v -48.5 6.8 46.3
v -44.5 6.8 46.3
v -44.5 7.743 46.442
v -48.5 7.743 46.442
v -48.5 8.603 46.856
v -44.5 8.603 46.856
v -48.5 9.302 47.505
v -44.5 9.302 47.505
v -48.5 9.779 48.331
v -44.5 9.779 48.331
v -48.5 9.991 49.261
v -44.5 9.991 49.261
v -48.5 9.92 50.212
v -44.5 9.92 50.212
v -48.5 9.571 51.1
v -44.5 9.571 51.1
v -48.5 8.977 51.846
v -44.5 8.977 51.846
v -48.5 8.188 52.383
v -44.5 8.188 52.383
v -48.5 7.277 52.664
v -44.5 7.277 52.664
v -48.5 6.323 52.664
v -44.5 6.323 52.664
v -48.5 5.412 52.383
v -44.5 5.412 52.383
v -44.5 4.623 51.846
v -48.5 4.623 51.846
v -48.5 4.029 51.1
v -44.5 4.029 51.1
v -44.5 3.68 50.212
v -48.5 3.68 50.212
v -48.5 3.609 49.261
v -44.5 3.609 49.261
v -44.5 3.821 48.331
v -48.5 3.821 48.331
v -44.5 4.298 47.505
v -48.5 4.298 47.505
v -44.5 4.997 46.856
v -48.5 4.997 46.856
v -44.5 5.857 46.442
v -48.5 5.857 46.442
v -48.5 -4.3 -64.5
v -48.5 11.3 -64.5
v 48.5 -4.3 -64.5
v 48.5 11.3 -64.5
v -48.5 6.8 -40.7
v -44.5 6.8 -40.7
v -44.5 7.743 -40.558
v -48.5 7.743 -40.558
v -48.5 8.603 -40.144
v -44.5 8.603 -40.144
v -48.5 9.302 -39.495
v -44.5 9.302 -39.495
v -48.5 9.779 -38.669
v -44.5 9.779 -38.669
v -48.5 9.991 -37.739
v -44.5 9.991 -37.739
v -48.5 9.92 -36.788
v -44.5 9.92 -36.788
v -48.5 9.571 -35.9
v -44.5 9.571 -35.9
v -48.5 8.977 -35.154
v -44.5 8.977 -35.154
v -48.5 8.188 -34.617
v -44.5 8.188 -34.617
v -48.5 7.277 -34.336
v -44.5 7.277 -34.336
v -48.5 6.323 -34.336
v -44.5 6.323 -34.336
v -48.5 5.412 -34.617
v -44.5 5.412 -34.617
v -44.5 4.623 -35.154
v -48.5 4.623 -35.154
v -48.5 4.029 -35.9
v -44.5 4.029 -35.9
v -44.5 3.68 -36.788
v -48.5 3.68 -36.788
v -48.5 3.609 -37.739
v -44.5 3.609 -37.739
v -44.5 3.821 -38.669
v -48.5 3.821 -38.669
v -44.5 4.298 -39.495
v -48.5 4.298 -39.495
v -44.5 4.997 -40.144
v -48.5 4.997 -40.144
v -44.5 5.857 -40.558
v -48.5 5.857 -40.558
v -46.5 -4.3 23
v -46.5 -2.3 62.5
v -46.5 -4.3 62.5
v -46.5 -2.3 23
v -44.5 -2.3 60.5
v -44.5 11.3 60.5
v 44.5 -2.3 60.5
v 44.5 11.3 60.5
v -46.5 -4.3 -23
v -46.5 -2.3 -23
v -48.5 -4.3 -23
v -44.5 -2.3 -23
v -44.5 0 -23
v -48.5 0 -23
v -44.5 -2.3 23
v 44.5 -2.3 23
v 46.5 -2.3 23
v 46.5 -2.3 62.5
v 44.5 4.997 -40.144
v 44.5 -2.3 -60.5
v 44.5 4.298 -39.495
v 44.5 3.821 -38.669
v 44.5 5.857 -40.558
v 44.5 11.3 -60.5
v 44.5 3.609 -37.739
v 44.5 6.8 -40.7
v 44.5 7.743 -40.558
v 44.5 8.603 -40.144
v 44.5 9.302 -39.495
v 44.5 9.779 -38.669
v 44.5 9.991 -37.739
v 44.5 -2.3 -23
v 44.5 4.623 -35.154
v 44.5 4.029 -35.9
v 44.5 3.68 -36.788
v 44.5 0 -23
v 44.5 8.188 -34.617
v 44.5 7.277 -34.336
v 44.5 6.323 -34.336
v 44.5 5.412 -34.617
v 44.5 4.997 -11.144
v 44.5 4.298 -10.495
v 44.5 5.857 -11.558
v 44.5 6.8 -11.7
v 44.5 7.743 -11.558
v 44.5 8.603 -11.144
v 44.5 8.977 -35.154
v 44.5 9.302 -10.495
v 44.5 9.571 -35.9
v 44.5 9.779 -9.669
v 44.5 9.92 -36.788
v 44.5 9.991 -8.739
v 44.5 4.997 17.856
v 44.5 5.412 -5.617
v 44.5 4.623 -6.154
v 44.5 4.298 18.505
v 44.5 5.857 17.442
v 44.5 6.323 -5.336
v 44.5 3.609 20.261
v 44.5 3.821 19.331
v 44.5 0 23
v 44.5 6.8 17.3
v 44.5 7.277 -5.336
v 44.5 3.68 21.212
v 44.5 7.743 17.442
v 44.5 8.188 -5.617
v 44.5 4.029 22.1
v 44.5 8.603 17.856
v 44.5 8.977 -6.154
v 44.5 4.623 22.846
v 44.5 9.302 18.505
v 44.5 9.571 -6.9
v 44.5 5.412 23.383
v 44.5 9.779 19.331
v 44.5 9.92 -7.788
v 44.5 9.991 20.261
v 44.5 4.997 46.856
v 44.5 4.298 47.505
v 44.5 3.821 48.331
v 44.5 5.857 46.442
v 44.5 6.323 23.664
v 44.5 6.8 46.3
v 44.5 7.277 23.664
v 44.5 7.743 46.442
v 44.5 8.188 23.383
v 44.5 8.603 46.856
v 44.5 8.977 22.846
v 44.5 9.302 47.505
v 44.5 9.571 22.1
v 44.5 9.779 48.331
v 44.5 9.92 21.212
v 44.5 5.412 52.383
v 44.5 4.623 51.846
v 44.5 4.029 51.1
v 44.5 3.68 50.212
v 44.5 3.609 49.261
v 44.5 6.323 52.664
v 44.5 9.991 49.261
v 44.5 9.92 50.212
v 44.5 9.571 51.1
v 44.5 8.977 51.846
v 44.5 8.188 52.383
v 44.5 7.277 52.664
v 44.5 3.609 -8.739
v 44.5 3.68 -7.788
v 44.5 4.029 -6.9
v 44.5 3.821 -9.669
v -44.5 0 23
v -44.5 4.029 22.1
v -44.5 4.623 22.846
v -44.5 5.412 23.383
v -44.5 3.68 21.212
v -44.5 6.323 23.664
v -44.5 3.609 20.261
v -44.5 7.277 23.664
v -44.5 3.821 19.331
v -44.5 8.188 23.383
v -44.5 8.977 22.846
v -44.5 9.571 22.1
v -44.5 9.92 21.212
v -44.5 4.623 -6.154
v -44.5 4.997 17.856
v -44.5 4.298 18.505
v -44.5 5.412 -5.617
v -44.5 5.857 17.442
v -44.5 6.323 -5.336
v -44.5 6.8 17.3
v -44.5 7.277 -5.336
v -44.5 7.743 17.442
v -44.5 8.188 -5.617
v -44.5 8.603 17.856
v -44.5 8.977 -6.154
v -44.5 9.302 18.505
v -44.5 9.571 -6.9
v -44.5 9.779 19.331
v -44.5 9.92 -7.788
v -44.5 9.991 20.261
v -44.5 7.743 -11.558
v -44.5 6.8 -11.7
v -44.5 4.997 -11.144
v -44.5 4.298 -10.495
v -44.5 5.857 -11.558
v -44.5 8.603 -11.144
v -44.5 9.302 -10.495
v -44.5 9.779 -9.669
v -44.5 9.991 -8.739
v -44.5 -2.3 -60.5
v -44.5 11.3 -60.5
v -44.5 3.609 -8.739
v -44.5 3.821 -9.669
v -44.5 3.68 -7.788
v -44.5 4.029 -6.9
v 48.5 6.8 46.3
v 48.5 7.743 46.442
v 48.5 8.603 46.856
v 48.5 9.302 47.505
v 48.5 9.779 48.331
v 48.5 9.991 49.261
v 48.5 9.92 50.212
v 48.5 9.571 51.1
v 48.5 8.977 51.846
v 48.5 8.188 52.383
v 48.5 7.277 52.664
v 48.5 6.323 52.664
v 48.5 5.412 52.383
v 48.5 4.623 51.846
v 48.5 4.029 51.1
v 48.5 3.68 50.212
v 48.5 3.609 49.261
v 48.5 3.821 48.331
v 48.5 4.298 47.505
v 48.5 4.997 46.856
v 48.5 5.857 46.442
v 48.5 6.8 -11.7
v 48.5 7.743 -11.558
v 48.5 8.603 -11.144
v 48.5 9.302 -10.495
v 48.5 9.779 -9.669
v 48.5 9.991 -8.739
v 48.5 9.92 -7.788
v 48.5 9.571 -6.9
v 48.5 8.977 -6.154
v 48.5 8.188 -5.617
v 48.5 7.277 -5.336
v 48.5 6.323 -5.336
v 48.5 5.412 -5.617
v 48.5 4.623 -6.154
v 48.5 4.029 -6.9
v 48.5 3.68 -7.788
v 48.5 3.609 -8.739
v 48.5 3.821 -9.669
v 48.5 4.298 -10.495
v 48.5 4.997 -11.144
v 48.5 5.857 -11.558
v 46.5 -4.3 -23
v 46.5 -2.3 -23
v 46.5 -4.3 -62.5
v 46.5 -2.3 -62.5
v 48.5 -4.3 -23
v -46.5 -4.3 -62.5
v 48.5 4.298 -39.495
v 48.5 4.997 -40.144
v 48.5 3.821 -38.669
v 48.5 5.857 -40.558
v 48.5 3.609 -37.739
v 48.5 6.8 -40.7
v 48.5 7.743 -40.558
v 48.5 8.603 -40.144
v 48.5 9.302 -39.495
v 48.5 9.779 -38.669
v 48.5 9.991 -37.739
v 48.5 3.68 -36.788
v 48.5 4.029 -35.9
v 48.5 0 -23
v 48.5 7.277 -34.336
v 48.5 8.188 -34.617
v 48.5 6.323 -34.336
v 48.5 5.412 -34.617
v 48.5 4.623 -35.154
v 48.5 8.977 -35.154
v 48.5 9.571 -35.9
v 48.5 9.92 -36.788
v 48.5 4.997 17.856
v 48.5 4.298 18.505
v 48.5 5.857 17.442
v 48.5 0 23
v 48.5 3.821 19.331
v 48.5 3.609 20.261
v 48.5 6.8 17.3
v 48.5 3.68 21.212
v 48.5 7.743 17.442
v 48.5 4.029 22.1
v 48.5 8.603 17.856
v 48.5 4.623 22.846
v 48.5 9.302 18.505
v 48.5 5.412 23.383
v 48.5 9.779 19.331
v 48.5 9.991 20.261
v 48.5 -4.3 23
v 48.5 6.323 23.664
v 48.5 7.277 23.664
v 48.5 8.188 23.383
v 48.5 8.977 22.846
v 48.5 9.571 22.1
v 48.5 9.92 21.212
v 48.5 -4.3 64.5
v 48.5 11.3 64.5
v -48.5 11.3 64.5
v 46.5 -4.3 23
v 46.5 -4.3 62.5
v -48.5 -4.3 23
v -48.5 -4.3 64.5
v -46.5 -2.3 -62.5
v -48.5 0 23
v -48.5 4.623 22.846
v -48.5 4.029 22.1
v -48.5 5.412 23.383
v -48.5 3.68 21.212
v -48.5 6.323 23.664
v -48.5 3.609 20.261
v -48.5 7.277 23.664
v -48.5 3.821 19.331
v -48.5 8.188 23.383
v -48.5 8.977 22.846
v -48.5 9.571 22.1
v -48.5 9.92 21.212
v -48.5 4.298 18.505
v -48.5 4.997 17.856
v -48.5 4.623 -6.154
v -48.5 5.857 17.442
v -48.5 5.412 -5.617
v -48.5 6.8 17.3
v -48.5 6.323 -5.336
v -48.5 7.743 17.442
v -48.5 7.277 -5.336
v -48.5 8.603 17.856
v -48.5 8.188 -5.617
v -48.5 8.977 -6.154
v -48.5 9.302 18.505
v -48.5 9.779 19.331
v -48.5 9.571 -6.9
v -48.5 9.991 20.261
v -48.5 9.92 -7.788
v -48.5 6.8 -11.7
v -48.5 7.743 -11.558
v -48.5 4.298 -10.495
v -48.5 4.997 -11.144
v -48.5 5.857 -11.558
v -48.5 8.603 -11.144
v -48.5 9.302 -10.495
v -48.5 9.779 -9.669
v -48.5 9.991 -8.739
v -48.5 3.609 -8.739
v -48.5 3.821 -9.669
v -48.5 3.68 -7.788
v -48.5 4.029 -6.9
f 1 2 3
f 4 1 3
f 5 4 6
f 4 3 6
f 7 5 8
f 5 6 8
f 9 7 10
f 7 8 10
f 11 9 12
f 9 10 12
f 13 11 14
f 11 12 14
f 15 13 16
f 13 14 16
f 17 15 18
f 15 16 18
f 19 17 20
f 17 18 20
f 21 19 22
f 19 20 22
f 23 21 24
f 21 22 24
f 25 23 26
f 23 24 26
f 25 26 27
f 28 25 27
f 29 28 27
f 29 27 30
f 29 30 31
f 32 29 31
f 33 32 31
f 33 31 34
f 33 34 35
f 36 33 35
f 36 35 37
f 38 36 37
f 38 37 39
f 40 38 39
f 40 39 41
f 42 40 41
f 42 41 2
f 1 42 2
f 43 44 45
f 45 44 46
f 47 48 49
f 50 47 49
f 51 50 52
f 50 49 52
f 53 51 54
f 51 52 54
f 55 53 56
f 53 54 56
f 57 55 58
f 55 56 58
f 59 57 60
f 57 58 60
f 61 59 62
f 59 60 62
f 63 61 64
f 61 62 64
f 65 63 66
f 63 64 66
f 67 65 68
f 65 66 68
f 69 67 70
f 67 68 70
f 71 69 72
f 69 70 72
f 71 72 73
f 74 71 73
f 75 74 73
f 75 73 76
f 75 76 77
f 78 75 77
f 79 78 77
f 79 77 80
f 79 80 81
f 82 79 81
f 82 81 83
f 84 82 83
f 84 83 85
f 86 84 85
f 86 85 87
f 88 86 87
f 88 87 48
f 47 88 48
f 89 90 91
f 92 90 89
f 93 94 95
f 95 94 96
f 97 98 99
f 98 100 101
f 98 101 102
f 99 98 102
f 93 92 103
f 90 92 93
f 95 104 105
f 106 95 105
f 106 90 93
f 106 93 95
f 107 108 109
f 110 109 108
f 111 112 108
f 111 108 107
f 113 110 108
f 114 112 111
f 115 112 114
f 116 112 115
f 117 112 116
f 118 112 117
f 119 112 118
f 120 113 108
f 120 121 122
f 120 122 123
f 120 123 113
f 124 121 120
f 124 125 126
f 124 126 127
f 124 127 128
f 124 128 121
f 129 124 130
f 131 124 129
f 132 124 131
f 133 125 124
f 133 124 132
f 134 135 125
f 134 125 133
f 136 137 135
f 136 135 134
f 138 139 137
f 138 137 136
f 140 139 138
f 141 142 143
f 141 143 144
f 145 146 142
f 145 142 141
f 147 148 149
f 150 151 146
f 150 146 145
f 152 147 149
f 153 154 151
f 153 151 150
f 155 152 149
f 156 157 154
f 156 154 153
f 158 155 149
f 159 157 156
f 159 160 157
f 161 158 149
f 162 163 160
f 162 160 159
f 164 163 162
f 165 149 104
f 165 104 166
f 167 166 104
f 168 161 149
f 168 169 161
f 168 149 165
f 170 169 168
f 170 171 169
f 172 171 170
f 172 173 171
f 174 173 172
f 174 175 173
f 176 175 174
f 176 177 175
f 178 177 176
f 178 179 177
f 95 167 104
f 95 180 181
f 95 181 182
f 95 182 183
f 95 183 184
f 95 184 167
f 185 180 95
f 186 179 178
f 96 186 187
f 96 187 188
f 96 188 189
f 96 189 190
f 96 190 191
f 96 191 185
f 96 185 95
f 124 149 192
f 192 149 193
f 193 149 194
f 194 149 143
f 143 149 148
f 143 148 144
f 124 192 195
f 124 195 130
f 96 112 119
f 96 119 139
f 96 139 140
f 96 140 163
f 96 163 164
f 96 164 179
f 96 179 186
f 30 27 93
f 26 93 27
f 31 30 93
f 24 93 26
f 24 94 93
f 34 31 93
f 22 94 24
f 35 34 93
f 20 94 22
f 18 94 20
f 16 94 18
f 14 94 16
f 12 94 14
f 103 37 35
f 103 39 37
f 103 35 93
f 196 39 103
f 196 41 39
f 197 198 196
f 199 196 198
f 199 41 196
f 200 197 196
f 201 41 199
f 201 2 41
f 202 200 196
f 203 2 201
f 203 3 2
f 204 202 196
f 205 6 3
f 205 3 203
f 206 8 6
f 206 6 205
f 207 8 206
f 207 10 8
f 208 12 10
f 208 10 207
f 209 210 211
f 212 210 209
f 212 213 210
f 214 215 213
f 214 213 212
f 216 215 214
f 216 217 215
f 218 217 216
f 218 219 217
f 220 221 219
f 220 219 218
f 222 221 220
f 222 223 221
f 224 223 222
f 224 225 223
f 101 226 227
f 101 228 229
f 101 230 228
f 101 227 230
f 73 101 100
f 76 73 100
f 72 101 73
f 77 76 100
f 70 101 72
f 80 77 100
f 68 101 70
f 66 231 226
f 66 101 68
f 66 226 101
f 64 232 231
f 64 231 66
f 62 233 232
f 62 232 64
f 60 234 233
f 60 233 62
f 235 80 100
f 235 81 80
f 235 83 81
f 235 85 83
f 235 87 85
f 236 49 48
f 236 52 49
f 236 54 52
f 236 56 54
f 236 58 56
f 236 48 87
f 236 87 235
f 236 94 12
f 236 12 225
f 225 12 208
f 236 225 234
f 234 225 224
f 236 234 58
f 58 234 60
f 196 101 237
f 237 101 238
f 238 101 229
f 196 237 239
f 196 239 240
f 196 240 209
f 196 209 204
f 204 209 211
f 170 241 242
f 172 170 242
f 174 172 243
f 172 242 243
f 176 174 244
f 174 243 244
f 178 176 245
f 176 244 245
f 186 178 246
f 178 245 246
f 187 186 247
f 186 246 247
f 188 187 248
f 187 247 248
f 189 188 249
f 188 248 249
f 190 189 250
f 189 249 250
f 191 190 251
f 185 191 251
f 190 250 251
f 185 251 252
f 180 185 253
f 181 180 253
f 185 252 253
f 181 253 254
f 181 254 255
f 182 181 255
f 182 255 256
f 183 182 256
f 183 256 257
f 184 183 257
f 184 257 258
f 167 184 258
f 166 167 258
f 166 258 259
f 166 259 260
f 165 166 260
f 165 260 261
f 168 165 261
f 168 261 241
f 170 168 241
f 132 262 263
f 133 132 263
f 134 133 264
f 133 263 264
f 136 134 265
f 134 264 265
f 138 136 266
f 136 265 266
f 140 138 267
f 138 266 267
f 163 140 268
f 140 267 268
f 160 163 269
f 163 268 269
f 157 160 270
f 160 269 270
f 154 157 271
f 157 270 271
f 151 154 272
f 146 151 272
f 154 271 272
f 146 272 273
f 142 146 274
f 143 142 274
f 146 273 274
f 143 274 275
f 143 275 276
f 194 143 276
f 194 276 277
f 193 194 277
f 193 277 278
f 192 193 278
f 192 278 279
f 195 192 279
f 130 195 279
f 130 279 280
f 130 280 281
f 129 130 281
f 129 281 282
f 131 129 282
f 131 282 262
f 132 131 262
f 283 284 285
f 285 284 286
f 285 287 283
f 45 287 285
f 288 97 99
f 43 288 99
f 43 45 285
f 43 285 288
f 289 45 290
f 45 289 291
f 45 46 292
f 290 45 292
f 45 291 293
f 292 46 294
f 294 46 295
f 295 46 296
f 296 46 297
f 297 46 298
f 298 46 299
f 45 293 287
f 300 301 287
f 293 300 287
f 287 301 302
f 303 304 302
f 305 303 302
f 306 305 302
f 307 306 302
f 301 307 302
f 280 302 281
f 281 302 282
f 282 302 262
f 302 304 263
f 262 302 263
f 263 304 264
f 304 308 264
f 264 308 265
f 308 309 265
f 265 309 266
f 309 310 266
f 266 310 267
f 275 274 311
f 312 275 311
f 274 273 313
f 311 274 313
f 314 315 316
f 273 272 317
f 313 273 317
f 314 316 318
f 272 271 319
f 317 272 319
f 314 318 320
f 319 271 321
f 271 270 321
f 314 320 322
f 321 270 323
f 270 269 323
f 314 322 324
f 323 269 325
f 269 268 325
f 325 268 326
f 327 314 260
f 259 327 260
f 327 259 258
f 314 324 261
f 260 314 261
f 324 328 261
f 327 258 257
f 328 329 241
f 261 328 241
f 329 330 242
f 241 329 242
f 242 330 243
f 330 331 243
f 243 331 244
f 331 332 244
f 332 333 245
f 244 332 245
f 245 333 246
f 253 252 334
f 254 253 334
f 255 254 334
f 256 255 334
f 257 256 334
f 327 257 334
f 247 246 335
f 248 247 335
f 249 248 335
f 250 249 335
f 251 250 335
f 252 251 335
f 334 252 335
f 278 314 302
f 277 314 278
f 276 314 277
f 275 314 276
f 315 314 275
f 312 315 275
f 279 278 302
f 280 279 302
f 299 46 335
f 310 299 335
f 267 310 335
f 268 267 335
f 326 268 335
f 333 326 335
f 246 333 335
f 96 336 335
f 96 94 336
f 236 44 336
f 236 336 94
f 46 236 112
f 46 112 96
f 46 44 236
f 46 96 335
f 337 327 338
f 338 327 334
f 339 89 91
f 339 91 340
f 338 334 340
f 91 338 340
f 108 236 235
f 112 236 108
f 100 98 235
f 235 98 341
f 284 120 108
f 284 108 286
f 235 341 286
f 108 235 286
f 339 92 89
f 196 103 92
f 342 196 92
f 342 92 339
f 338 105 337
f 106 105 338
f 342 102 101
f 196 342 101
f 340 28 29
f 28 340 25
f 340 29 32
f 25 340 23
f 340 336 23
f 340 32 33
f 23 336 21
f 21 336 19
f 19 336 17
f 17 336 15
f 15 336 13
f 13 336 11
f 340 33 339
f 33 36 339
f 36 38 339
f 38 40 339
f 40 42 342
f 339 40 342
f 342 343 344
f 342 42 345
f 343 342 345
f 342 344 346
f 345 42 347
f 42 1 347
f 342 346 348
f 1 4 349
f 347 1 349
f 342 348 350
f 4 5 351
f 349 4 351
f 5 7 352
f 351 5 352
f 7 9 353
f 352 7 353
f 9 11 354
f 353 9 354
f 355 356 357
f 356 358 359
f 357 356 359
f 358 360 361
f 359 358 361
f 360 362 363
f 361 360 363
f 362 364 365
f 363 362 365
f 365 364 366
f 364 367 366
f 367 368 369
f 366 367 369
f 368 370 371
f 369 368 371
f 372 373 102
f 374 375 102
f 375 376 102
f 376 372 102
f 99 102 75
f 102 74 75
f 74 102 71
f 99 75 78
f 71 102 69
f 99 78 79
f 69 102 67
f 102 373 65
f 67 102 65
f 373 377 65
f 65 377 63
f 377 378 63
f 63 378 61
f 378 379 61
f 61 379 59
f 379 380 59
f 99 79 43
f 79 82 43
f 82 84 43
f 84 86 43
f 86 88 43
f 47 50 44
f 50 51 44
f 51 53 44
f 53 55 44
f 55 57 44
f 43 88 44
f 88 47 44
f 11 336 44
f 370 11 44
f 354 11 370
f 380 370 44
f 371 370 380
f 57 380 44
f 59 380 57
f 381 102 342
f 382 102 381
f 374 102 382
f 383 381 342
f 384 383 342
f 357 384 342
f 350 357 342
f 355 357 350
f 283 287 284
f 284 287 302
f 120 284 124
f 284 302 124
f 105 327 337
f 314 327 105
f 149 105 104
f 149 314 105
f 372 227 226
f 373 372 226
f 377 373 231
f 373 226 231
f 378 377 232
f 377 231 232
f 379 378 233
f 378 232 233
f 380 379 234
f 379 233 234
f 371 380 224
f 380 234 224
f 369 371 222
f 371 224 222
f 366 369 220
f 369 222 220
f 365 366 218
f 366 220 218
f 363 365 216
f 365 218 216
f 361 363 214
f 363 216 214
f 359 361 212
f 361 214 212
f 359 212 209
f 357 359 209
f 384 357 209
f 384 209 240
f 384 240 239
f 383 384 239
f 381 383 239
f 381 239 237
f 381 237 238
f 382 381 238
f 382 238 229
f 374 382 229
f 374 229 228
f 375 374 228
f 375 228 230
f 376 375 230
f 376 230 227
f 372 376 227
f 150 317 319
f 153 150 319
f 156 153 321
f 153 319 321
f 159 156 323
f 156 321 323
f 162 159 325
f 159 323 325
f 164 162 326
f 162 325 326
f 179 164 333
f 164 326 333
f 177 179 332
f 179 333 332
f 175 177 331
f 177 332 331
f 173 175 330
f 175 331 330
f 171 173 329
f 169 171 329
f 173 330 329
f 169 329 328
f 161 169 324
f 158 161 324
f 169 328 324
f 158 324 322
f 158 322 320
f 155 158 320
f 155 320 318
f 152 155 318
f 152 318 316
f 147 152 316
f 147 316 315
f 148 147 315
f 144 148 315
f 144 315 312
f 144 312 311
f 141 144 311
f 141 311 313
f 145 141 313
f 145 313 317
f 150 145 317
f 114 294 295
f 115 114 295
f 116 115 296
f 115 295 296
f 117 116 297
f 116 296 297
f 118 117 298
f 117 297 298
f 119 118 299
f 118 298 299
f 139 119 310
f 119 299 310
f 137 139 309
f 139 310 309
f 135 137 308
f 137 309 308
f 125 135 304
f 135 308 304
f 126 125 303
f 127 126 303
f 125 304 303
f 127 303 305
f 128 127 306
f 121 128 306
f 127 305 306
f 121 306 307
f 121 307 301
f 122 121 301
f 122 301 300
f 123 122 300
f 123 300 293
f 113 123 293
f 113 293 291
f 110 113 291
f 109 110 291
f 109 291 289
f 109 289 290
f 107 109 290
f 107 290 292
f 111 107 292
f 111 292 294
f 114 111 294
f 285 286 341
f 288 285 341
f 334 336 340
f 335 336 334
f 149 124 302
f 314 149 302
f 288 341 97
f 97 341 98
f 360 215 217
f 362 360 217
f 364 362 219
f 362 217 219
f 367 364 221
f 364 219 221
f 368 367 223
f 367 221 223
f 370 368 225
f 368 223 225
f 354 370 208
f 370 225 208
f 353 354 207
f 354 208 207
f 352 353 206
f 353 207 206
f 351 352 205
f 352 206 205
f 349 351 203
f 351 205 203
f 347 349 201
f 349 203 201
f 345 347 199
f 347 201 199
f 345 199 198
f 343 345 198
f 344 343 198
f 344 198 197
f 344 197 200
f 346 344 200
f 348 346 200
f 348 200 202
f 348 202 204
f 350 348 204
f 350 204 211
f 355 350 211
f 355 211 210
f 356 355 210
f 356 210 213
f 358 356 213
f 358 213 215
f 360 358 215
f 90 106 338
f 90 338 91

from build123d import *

# Parameters (mm, degrees)
SKETCH1_W           = 97
SKETCH1_H           = 129
SKETCH1_W_2         = 89
SKETCH1_H_2         = 121
BOSS_EXTRUDE1_DEPTH = 11.3
SKETCH3_R           = 3.2
CUT_EXTRUDE1_DEPTH  = 118.033926705
LPATTERN1_COUNT     = 4
LPATTERN1_PITCH     = 29
BOSS_EXTRUDE2_DEPTH = 2.3
BOSS_EXTRUDE3_DEPTH = 2


with BuildPart() as part:
    # Sketch1 → Boss-Extrude1 (new body)
    with BuildSketch(Plane(origin=(0, 0, 0), x_dir=(1, 0, 0), z_dir=(0, 1, 0))):
        Rectangle(SKETCH1_W, SKETCH1_H)
        Rectangle(SKETCH1_W_2, SKETCH1_H_2, mode=Mode.SUBTRACT)
    extrude(amount=BOSS_EXTRUDE1_DEPTH)

    # Sketch3 → Cut-Extrude1 (cut, through all)
    with BuildSketch(Plane(origin=(48.5, 0, 0), x_dir=(0, 0, -1), z_dir=(1, 0, 0))):
        with Locations((-49.5, 6.8)):
            Circle(SKETCH3_R)
    cut_extrude1 = extrude(amount=-CUT_EXTRUDE1_DEPTH, mode=Mode.SUBTRACT)

    # LPattern1: Cut-Extrude1 ×4
    with Locations(*[(0, 0, -i * LPATTERN1_PITCH) for i in range(1, LPATTERN1_COUNT)]):
        add(cut_extrude1, mode=Mode.SUBTRACT)

    # Sketch5 → Boss-Extrude2 (add)
    with BuildSketch(Plane.XZ):
        Polygon((44.5, 60.5), (44.5, 23), (48.5, 23), (48.5, 64.5), (-48.5, 64.5), (-48.5, 23), (-44.5, 23), (-44.5, 60.5), align=None)
    boss_extrude2 = extrude(amount=BOSS_EXTRUDE2_DEPTH)

    # Sketch6 → Boss-Extrude3 (add)
    with BuildSketch(Plane.XZ.offset(2.3)):
        Polygon((-48.5, 23), (-48.5, 64.5), (48.5, 64.5), (48.5, 23), (46.5, 23), (46.5, 62.5), (-46.5, 62.5), (-46.5, 23), align=None)
    boss_extrude3 = extrude(amount=BOSS_EXTRUDE3_DEPTH)

    # Mirror1: Boss-Extrude2, Boss-Extrude3 across plane
    add(boss_extrude2.mirror(Plane.XY))
    add(boss_extrude3.mirror(Plane.XY))


solid = part.part
